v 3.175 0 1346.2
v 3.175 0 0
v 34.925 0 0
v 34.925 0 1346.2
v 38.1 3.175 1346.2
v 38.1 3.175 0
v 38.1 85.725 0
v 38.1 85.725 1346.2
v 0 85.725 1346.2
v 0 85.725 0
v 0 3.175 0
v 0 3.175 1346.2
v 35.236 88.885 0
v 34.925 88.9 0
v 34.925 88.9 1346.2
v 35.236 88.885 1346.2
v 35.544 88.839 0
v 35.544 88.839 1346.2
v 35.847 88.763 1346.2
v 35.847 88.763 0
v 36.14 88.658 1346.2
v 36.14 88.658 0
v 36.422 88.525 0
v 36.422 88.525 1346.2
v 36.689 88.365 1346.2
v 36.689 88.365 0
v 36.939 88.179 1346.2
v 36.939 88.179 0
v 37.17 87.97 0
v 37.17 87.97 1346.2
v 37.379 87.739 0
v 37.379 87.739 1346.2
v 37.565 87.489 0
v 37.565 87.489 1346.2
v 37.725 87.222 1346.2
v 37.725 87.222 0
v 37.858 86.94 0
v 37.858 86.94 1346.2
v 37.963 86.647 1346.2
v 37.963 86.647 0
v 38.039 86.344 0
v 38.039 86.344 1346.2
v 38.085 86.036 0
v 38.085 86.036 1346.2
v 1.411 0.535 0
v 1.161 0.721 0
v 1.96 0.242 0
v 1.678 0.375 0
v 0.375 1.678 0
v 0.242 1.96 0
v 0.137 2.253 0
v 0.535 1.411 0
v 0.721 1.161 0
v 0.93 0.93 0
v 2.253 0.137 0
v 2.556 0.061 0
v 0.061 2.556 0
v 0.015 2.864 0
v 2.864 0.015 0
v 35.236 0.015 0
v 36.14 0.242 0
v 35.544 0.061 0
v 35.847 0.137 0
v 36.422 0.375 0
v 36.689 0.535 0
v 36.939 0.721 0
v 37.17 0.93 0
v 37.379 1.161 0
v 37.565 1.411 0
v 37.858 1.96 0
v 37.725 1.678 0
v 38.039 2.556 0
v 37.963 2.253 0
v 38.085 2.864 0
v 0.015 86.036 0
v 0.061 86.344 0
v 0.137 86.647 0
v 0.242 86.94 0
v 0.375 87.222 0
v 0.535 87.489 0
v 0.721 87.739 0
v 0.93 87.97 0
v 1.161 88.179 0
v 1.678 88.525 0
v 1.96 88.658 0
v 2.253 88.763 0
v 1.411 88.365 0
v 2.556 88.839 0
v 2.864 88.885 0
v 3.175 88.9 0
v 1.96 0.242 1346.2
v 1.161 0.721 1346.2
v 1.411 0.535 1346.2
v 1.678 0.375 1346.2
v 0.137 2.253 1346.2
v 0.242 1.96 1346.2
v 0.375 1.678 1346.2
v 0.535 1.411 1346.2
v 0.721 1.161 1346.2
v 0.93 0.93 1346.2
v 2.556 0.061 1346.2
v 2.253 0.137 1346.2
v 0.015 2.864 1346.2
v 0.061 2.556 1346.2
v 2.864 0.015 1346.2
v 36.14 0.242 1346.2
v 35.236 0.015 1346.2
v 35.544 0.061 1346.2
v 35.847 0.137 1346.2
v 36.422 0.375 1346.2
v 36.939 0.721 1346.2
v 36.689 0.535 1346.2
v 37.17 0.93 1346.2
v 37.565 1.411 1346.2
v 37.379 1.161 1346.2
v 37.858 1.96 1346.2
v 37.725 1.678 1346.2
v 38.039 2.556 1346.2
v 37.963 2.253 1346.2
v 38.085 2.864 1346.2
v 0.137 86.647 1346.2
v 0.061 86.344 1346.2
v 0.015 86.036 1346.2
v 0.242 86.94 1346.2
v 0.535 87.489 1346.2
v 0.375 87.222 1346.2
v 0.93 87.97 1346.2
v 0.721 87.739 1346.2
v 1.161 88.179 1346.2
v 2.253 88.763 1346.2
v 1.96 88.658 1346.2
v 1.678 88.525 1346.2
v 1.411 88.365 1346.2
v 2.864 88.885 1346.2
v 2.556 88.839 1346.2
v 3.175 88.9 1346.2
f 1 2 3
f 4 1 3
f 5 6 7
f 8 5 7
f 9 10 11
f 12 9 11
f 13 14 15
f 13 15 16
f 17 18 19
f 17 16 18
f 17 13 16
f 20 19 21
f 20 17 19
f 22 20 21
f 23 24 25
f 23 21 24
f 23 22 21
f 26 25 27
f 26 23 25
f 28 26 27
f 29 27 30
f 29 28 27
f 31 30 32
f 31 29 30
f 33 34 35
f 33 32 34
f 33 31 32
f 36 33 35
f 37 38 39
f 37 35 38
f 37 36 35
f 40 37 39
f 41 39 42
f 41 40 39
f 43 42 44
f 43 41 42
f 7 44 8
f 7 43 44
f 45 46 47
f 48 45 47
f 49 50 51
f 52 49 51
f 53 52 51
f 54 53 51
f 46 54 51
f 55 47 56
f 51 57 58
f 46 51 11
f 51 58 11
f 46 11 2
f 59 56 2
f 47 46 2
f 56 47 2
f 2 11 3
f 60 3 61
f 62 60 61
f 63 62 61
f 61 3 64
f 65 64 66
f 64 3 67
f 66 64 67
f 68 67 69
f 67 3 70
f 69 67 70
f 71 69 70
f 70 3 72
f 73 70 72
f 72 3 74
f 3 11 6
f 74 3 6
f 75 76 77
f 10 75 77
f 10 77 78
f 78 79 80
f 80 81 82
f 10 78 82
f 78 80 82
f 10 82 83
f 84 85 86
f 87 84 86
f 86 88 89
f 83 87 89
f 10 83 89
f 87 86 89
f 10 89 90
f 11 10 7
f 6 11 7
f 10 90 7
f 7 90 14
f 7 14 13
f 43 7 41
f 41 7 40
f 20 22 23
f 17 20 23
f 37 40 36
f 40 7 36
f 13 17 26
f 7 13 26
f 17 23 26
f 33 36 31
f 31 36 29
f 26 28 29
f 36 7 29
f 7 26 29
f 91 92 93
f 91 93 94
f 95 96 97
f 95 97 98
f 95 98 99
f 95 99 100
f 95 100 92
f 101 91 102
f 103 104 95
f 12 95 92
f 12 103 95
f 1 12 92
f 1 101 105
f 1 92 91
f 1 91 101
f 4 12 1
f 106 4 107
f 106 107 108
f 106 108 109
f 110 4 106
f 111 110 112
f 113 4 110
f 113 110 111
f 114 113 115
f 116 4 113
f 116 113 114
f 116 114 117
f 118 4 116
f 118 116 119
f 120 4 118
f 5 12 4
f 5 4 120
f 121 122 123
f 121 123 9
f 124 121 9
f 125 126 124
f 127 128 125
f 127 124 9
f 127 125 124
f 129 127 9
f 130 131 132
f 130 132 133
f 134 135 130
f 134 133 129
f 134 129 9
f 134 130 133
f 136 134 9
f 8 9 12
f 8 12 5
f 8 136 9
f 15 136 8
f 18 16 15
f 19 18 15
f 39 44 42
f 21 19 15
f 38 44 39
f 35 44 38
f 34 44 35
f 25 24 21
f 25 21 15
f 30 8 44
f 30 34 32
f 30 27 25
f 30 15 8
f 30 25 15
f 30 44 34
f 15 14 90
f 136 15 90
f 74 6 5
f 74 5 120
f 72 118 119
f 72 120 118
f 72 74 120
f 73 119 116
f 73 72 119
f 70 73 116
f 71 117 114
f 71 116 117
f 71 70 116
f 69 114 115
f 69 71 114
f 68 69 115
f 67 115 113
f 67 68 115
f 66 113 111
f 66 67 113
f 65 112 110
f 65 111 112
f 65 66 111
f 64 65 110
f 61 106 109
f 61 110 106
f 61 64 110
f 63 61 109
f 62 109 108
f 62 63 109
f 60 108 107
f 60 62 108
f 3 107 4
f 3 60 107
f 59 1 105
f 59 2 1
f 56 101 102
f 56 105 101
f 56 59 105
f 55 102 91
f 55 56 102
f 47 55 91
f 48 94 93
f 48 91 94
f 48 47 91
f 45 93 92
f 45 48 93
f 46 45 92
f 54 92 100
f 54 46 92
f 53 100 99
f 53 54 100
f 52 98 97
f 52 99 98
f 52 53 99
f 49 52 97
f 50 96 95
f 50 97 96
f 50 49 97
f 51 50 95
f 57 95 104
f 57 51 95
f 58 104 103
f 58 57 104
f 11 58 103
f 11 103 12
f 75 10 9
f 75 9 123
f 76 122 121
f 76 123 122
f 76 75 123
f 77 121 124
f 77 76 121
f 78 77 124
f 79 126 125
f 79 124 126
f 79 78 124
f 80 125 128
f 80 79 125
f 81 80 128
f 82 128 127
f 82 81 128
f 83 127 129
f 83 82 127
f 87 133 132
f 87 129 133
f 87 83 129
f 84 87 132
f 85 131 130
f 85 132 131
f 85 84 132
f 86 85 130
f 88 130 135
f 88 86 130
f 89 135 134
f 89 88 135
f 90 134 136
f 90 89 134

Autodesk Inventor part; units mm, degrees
ref_plane "YZ Plane" through (0, 0, 0) normal (1, 0, 0) x (0, 1, 0)
ref_plane "XZ Plane" through (0, 0, 0) normal (0, 1, 0) x (-1, 0, 0)
ref_plane "XY Plane" through (0, 0, 0) normal (0, 0, 1) x (1, 0, 0)
sketch "Sketch1" plane through (0, 0, 0) normal (0, 0, 1) x (1, 0, 0)
  line L0 (3.175, 0) -> (34.925, 0)
  line L1 (38.1, 3.175) -> (38.1, 85.725)
  line L2 (34.925, 88.9) -> (3.175, 88.9)
  line L3 (0, 85.725) -> (0, 3.175)
  arc A0 (3.175, 88.9) -> (0, 85.725) centre (3.175, 85.725) ccw
  arc A1 (38.1, 85.725) -> (34.925, 88.9) centre (34.925, 85.725) ccw
  arc A2 (34.925, 0) -> (38.1, 3.175) centre (34.925, 3.175) ccw
  arc A3 (0, 3.175) -> (3.175, 0) centre (3.175, 3.175) ccw
  point P0 (0, 0)
  point P1 (38.1, 88.9)
  point P2 (38.1, 0)
  point P3 (0, 88.9)
  dimension "d0" = 38.1
  dimension "d1" = 88.9
  dimension "d2" = 3.175
extrude "Extrusion1" add sketch "Sketch1" along normal blind 1346.2
properties part number "2x4_Wood" material "Pine Wood"
